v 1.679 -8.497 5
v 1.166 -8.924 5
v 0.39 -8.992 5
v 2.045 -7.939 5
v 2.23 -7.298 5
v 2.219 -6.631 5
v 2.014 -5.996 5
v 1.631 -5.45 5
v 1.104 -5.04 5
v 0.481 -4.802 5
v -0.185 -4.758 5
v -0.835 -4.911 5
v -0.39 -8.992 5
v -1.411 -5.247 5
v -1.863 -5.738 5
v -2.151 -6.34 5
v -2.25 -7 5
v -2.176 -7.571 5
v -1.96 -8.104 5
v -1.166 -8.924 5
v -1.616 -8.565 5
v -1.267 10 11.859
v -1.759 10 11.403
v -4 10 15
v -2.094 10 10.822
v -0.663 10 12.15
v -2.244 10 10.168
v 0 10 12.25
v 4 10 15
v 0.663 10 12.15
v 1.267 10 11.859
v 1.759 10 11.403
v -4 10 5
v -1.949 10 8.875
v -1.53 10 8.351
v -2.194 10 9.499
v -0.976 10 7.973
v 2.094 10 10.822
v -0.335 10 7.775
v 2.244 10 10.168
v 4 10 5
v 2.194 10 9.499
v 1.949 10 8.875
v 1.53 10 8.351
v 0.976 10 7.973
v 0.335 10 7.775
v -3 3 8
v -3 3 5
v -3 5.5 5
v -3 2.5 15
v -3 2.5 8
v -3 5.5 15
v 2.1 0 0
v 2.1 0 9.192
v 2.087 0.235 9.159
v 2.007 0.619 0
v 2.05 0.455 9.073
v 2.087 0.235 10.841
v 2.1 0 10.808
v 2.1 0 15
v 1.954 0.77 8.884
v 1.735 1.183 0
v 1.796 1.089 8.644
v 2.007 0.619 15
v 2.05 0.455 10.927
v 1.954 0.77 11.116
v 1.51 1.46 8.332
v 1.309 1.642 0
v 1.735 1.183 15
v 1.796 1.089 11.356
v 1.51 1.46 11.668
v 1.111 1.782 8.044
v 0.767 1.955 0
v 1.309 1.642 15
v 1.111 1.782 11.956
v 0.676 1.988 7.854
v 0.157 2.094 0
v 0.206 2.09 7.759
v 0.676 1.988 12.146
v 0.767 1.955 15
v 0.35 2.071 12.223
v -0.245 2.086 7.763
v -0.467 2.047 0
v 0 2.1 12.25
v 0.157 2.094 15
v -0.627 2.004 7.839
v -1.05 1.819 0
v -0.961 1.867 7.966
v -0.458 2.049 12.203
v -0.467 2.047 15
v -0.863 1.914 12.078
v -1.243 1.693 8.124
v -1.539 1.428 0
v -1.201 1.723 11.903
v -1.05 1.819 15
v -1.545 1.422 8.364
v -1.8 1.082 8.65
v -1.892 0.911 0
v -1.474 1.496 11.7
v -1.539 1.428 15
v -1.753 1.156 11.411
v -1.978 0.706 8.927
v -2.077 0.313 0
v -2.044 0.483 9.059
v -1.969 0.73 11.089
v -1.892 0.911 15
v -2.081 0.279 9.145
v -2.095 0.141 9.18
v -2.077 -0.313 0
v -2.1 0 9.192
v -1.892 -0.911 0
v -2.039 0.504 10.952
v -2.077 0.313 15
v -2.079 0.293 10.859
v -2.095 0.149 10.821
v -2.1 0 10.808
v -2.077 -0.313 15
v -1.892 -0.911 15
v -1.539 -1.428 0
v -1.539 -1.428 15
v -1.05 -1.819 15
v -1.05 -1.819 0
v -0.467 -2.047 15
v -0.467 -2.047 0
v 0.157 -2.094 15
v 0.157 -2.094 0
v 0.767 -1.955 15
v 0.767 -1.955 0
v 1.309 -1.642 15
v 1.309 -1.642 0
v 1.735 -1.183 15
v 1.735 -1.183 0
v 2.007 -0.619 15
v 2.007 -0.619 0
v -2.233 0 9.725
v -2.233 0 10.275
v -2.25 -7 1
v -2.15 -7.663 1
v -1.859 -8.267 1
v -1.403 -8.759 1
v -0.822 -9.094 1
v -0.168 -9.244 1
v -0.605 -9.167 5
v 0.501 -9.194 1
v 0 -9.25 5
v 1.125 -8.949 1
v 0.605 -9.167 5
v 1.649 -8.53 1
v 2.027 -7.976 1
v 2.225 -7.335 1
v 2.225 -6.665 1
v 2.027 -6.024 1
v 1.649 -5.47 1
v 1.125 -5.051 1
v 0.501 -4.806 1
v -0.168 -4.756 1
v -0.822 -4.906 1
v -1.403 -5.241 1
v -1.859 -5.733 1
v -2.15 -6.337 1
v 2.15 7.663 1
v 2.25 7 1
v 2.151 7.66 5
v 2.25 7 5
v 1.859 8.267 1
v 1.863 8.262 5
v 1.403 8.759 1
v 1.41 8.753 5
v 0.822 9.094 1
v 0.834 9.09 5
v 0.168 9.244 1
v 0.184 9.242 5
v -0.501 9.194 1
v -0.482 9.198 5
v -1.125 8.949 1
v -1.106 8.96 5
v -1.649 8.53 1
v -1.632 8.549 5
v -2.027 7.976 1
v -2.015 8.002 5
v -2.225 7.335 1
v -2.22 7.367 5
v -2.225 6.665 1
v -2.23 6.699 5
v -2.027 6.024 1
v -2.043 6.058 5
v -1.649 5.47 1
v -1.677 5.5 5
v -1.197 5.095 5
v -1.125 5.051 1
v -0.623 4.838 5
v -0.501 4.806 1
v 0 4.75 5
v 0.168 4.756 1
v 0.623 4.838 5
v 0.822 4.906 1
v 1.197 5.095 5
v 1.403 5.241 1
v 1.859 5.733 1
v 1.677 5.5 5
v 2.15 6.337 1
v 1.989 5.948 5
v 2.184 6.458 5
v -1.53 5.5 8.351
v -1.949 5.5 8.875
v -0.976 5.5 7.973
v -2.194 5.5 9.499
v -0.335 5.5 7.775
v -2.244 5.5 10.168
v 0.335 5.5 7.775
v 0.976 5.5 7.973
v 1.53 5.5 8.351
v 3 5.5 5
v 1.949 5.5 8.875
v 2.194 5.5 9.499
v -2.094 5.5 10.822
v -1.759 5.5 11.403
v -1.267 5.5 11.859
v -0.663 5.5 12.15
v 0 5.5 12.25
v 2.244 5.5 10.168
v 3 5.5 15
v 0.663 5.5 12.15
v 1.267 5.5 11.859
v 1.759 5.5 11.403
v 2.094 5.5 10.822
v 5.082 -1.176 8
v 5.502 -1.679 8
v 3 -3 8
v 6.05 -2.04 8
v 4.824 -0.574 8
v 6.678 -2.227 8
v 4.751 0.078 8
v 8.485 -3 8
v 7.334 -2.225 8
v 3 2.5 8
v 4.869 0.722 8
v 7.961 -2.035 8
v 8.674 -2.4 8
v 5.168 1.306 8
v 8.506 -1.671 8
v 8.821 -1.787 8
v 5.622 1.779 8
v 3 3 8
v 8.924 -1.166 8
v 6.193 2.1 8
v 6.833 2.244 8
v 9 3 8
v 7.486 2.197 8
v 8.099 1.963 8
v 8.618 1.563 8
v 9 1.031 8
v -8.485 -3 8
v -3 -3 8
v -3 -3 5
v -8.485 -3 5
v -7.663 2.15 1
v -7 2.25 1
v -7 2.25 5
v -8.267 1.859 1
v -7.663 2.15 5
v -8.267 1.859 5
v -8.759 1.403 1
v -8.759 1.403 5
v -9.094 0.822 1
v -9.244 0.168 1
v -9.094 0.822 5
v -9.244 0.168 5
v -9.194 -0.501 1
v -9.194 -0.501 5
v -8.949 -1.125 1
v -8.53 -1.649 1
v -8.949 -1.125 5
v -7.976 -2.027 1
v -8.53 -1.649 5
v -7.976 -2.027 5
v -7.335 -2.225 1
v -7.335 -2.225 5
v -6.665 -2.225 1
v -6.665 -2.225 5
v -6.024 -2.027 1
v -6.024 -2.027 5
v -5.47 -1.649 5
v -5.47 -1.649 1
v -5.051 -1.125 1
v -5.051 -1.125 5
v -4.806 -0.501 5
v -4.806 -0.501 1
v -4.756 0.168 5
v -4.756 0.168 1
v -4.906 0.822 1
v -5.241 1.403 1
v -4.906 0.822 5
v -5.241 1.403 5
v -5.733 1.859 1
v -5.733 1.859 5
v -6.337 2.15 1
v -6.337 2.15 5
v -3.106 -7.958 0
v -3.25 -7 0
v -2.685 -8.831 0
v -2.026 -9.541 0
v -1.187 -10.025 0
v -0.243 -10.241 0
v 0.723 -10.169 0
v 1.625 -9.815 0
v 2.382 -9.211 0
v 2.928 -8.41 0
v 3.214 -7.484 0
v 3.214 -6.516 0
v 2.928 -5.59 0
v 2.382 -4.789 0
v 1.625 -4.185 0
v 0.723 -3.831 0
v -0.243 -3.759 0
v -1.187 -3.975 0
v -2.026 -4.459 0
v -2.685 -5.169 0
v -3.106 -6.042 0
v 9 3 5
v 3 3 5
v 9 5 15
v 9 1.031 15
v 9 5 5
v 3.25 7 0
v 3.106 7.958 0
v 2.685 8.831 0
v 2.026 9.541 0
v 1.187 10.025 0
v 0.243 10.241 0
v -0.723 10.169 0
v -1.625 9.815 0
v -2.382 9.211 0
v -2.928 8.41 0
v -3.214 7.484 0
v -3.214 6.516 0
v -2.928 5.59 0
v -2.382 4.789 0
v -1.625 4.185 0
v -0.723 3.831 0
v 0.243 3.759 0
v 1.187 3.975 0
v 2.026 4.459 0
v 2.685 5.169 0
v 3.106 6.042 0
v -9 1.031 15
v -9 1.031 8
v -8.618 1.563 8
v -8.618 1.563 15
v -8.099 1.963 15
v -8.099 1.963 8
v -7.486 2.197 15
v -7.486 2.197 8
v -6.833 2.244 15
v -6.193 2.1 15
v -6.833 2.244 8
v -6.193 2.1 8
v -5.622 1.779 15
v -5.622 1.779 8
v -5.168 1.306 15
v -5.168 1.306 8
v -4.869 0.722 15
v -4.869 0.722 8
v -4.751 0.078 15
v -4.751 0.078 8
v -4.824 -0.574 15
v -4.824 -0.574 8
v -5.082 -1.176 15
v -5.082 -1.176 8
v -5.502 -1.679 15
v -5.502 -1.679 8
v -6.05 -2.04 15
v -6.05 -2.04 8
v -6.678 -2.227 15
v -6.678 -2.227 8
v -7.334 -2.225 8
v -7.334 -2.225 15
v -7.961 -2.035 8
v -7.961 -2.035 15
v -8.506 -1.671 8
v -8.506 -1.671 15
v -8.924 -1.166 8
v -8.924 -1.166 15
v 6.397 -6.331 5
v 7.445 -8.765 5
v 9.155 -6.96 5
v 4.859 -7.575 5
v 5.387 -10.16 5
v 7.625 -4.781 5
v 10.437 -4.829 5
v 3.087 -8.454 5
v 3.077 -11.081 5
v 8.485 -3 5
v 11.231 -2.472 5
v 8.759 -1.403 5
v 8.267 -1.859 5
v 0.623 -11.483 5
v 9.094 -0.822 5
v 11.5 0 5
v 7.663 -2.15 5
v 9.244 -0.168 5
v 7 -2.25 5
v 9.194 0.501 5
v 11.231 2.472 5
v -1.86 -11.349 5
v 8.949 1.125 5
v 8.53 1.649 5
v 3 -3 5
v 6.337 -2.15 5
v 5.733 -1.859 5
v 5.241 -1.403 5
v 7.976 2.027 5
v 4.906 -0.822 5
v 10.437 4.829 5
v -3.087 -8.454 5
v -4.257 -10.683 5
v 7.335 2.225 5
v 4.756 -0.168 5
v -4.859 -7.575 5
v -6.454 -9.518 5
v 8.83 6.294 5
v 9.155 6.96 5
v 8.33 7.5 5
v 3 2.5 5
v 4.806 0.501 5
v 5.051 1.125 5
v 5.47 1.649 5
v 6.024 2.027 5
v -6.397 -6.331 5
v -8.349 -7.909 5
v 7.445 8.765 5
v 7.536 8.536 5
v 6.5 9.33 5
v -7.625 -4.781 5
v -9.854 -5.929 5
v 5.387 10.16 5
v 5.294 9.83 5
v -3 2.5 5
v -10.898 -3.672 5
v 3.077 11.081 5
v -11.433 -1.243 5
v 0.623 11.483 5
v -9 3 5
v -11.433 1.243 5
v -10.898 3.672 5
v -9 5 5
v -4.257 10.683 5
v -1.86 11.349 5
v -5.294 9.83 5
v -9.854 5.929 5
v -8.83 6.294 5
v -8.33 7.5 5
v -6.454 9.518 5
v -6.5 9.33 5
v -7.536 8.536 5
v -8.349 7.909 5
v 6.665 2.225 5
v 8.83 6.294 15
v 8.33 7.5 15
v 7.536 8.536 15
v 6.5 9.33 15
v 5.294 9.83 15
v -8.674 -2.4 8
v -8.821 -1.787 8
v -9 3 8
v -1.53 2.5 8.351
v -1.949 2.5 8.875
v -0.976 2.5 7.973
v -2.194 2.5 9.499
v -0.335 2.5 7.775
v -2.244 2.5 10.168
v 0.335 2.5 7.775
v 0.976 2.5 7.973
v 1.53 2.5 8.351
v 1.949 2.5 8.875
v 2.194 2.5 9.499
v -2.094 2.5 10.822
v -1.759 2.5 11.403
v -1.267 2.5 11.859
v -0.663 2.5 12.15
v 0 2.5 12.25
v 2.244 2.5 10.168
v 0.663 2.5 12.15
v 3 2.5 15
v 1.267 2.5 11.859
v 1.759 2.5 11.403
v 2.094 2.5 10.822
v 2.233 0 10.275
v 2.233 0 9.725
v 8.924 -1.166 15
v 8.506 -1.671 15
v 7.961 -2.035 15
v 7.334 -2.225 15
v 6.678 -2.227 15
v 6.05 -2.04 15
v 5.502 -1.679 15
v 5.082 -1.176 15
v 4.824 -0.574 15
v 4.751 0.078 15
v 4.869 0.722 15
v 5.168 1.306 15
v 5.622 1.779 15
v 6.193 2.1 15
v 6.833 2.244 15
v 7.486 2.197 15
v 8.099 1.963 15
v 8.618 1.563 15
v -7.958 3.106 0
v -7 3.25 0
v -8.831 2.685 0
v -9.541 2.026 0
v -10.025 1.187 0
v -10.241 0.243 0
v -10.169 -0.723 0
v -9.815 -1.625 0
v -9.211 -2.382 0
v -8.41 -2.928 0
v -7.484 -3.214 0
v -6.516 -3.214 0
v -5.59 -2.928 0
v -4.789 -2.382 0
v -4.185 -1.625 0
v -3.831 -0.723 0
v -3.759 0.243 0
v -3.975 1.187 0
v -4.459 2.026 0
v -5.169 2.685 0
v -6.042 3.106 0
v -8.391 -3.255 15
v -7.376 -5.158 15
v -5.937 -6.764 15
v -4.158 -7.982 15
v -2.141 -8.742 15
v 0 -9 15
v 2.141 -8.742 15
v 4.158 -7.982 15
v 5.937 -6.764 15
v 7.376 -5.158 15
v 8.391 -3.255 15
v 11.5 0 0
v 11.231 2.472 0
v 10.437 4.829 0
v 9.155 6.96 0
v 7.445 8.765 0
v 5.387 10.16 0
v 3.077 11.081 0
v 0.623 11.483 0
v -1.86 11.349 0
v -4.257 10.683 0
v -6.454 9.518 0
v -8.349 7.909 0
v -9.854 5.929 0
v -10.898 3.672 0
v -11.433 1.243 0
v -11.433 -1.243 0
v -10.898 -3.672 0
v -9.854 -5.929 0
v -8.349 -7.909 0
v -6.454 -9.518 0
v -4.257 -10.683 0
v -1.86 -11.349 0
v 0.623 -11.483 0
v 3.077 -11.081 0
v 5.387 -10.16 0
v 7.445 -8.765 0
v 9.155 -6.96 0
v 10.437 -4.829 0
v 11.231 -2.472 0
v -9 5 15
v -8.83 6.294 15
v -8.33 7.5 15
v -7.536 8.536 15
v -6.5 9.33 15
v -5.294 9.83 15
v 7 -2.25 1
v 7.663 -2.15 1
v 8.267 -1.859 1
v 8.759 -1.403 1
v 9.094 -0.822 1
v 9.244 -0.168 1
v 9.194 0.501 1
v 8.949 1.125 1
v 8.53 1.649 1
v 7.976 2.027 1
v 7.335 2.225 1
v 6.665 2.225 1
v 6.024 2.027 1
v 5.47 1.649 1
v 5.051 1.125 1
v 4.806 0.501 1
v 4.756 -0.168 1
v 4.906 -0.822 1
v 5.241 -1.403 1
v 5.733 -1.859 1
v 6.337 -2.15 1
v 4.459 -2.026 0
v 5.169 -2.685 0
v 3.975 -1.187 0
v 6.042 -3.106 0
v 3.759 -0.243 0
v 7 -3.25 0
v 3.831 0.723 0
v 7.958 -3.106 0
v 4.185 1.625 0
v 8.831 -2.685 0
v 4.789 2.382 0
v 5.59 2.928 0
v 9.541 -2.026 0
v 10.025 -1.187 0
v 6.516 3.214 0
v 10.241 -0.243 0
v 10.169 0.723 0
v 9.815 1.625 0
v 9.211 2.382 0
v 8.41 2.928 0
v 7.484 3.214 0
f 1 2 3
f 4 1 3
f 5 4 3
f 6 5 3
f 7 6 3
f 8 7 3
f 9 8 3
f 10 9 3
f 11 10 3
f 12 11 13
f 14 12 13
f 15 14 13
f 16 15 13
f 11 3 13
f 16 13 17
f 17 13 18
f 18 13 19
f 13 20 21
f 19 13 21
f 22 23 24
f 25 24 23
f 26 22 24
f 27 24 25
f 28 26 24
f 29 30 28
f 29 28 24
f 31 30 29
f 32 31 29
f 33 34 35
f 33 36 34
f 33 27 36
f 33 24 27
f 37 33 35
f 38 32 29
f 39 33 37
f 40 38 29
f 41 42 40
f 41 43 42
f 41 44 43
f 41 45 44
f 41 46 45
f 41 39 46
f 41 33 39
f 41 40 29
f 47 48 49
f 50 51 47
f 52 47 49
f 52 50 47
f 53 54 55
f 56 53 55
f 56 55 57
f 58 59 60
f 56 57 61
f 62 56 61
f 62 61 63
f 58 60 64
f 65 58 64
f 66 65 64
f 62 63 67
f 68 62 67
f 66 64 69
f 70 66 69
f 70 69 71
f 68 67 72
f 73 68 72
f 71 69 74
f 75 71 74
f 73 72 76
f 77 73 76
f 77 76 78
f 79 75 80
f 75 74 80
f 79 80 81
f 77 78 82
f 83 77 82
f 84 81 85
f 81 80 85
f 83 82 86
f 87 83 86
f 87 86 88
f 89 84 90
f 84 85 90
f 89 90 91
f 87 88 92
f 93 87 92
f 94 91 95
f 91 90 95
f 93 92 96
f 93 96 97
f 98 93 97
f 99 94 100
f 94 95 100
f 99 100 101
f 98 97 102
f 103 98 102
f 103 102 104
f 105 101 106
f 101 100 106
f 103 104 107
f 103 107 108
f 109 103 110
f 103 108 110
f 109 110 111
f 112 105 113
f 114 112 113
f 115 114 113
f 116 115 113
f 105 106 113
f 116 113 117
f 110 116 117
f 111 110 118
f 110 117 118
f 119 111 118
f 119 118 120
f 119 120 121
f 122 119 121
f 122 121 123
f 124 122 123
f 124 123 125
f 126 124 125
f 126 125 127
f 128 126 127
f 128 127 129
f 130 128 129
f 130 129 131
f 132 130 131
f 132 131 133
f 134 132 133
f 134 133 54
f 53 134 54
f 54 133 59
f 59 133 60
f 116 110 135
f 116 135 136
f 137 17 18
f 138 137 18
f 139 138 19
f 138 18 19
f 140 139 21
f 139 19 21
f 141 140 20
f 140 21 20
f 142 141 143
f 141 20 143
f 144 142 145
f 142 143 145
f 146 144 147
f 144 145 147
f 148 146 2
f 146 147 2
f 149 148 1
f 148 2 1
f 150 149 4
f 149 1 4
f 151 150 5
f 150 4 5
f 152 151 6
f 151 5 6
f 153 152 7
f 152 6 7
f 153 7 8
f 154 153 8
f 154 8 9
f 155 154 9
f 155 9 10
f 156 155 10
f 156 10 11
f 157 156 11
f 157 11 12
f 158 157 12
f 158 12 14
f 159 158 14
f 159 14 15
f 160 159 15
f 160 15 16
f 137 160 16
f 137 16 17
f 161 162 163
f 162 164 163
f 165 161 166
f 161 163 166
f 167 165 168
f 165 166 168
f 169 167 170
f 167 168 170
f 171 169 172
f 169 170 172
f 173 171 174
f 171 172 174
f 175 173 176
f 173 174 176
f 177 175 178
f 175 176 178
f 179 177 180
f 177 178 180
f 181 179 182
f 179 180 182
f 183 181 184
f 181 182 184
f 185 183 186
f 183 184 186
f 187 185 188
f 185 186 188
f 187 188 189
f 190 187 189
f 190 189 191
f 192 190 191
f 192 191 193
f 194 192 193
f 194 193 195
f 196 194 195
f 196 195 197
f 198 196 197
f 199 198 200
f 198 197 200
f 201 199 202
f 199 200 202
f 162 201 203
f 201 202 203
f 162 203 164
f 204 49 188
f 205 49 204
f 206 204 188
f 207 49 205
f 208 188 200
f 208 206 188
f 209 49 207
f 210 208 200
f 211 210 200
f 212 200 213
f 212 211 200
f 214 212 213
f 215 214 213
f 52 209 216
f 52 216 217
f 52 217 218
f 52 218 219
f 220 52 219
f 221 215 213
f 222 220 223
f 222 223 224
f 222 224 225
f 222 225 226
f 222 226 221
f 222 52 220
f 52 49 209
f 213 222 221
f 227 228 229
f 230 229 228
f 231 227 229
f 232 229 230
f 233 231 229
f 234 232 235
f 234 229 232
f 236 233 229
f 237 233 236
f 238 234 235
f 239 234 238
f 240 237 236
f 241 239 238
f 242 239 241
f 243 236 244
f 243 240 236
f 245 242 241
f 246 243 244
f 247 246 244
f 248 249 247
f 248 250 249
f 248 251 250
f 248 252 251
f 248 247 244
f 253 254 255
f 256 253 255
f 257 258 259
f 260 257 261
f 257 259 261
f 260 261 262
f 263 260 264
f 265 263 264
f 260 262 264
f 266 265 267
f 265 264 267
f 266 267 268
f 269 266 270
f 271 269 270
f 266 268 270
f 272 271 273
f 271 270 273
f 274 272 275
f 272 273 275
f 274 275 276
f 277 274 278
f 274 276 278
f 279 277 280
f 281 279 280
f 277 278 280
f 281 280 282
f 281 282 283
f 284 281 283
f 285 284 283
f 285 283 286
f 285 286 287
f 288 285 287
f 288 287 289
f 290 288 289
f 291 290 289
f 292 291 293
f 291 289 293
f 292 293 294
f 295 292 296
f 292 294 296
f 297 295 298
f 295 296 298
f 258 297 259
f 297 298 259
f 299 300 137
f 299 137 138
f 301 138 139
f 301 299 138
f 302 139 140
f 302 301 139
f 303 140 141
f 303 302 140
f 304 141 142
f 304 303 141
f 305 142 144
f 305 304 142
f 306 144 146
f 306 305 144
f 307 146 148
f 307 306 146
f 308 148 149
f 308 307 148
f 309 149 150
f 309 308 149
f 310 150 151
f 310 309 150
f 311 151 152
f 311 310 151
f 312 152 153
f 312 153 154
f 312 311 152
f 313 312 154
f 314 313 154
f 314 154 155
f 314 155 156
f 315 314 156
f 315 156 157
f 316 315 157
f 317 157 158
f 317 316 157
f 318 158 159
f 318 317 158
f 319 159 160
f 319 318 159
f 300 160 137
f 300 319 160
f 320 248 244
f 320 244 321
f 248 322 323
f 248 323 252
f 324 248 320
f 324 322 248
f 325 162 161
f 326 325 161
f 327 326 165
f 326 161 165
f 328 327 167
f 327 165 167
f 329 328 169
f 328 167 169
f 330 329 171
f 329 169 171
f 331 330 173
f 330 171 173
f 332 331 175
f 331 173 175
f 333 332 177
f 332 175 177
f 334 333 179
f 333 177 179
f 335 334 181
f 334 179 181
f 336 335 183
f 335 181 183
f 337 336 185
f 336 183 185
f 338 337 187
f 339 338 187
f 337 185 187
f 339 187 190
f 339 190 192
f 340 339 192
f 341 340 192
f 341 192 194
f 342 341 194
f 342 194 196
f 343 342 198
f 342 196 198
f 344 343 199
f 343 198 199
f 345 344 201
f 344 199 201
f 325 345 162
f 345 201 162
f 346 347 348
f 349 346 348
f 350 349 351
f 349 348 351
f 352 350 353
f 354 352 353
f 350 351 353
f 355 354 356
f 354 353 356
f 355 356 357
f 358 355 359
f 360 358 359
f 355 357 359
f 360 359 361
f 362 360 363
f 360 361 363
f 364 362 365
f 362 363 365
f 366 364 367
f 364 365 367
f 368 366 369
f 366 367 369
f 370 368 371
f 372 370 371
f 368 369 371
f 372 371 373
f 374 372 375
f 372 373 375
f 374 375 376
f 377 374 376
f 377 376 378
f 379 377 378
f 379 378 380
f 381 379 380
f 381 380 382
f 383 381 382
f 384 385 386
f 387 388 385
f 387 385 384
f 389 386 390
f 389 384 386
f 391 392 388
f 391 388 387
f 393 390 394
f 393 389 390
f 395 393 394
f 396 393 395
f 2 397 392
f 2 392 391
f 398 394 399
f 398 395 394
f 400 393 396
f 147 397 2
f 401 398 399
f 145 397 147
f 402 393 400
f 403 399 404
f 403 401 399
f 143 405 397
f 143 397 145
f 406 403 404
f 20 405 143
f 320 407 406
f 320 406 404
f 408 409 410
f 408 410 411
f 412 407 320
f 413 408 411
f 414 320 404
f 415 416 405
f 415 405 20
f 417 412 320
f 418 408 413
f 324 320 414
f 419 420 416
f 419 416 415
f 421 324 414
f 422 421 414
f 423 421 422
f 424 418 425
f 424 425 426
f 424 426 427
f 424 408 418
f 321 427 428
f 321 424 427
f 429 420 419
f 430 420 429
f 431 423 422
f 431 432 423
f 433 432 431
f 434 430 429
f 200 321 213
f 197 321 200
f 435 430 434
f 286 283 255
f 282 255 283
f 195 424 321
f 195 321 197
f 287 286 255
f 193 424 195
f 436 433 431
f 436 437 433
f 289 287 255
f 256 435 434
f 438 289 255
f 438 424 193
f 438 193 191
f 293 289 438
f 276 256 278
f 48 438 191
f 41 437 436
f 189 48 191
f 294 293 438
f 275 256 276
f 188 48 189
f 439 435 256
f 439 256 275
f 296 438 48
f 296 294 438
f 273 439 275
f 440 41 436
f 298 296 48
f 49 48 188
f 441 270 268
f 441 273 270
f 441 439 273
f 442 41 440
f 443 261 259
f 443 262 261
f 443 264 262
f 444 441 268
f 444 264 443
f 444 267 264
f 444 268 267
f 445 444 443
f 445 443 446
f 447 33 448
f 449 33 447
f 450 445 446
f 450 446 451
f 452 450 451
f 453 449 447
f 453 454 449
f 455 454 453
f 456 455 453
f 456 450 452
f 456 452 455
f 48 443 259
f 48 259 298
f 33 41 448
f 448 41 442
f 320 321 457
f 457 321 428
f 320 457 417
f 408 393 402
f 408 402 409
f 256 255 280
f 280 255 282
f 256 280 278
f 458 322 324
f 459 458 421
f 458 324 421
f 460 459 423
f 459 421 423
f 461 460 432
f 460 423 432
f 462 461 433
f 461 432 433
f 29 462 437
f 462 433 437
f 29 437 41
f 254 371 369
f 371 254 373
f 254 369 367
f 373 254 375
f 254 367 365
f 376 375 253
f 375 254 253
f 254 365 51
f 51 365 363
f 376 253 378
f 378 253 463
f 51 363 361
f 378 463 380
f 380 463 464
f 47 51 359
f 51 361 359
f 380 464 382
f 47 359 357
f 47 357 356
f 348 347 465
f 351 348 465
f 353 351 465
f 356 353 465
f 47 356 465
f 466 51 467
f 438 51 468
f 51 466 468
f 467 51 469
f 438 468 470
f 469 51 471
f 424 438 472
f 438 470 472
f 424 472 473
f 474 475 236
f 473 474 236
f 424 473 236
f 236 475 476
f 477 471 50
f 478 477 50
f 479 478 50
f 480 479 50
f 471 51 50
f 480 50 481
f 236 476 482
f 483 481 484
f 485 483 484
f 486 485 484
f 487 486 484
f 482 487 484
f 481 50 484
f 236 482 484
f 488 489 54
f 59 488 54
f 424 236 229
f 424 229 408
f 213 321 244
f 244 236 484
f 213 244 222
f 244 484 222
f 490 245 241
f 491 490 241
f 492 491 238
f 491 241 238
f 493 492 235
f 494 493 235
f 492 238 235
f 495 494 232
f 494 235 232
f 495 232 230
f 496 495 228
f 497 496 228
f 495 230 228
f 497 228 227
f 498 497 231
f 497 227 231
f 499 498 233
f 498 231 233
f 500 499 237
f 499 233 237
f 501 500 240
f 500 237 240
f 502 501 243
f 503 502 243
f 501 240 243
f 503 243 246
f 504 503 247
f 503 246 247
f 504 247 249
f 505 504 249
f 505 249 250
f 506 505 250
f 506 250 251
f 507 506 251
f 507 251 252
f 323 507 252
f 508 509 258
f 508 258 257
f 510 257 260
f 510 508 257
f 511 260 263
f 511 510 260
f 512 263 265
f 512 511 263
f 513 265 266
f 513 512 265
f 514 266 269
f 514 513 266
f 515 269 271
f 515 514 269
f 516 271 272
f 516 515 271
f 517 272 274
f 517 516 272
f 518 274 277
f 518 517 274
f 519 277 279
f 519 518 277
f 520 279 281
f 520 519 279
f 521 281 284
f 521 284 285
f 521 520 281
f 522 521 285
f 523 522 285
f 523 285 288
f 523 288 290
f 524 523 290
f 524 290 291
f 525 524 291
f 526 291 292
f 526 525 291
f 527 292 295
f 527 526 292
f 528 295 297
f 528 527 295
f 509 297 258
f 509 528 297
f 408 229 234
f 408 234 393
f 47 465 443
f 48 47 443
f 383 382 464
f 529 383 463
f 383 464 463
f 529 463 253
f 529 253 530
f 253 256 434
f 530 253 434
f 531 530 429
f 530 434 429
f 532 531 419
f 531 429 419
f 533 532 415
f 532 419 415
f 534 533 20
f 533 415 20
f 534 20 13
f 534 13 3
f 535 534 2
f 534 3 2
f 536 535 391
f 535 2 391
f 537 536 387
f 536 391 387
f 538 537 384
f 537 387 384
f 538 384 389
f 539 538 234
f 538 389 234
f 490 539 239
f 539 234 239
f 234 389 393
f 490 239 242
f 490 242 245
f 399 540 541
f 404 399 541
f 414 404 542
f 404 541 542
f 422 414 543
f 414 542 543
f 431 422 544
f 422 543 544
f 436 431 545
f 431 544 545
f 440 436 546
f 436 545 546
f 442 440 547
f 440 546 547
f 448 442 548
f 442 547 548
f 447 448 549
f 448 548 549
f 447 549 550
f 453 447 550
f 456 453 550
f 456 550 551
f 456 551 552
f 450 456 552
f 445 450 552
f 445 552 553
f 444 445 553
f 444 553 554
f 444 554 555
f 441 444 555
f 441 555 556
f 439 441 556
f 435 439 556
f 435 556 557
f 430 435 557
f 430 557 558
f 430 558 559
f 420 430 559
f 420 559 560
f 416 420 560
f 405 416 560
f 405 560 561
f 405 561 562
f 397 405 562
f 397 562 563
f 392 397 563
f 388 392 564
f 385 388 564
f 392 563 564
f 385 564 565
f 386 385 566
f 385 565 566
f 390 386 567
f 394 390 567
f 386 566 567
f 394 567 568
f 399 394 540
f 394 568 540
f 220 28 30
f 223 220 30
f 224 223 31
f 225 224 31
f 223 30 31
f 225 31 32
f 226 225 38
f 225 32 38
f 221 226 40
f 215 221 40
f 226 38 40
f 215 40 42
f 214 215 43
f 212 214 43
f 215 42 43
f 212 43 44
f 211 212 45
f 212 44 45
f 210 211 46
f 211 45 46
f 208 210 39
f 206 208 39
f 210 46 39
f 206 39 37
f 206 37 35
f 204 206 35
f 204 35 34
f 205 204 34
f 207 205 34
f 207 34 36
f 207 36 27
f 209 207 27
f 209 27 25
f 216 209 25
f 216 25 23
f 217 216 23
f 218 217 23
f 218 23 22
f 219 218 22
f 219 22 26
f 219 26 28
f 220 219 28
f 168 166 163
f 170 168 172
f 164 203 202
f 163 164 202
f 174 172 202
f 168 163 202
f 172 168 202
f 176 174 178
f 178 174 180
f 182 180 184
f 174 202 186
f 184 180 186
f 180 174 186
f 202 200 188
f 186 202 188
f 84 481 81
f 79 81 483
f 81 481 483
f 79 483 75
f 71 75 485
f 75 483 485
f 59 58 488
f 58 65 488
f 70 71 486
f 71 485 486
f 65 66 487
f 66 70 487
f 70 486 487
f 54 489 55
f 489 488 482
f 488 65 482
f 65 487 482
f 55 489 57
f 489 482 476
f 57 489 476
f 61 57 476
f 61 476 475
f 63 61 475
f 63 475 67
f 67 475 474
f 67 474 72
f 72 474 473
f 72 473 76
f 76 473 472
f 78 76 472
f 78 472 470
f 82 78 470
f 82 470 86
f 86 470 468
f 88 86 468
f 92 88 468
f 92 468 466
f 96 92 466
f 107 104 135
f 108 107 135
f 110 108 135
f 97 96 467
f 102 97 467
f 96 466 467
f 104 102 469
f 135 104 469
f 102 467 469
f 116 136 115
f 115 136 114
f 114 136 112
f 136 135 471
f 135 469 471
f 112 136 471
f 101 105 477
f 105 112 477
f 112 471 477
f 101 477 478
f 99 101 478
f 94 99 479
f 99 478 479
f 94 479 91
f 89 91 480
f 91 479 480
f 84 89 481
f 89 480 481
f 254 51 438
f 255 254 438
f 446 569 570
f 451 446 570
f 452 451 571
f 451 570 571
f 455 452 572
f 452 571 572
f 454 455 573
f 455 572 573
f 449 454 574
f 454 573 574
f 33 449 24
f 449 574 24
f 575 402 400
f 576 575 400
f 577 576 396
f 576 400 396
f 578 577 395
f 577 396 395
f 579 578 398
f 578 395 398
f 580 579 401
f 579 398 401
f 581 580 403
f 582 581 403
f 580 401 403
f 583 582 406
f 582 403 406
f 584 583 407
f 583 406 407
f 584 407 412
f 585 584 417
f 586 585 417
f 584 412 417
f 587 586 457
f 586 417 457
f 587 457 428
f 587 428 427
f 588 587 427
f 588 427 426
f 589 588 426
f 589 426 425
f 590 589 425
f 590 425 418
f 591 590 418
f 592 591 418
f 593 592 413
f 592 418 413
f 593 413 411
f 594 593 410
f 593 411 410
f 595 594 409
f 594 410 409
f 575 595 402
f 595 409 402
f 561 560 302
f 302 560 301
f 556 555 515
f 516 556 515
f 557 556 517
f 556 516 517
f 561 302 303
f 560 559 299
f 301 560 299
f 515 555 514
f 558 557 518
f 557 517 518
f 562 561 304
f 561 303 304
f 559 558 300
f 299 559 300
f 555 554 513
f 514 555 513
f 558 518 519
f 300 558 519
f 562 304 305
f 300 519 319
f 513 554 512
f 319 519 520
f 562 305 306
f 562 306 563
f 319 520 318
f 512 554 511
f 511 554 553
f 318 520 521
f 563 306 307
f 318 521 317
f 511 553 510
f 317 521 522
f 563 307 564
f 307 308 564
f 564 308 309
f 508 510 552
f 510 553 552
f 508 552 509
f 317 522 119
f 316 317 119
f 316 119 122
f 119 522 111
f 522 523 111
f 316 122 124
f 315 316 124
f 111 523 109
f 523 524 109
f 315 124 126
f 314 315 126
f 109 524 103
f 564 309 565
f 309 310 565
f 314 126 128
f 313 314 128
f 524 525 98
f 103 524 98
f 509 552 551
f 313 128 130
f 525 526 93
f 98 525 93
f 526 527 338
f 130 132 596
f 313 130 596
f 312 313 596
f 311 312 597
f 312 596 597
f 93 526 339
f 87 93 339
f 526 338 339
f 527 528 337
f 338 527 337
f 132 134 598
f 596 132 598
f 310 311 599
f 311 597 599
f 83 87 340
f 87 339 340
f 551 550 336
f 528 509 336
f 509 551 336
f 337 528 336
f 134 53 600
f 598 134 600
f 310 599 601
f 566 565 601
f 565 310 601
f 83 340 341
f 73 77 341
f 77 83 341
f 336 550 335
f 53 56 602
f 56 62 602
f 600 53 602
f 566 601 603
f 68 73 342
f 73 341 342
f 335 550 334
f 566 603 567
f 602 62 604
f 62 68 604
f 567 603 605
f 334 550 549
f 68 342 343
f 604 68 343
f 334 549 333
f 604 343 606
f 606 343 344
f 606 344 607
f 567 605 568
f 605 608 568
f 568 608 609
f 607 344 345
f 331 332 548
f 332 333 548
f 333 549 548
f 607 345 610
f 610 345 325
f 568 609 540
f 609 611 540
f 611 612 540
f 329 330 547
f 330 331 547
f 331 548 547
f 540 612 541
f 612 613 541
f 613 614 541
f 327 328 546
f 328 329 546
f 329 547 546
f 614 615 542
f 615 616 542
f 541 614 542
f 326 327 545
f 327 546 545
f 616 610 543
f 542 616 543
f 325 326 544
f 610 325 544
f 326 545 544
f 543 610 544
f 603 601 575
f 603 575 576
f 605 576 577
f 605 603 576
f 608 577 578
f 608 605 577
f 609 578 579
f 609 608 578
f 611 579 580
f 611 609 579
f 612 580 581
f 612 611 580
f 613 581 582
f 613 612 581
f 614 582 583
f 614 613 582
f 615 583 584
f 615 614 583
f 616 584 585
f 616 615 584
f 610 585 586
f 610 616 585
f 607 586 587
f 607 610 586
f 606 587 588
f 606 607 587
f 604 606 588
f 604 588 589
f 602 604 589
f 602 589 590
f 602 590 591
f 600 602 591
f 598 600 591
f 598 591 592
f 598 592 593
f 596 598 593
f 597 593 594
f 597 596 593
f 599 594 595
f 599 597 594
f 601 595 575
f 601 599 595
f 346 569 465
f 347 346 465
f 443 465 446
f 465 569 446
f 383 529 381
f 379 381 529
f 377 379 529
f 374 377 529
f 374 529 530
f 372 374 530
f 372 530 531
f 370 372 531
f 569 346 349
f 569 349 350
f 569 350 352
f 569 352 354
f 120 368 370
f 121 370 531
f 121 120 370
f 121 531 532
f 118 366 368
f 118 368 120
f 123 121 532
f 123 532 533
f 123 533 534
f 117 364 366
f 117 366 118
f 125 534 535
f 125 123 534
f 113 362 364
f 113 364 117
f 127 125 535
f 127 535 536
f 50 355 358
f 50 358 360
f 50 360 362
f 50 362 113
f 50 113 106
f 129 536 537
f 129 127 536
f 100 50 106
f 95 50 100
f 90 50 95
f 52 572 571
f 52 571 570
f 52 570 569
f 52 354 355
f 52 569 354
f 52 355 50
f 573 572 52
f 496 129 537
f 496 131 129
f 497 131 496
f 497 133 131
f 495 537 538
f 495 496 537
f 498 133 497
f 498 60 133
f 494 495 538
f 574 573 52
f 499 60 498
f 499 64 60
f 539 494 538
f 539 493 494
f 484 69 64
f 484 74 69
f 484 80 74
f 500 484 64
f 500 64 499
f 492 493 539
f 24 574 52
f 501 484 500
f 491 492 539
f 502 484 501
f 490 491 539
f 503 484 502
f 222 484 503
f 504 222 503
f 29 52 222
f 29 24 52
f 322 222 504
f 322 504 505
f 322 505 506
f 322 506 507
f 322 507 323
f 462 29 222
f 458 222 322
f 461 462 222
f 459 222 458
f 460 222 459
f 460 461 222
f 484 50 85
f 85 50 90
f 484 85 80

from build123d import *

# Parameters (mm, degrees)
SKETCH1_R           = 11.5
BOSS_EXTRUDE1_DEPTH = 5
SKETCH2_R           = 2.25
CUT_EXTRUDE1_DEPTH  = 18.014699527
CIRPATTERN1_COUNT   = 4
SKETCH3_R           = 9
BOSS_EXTRUDE2_DEPTH = 10
SKETCH4_R           = 2.1
CUT_EXTRUDE2_DEPTH  = 23.12464689
BOSS_EXTRUDE3_REACH = 30.627
SKETCH5_W           = 18
SKETCH5_H           = 10
SKETCH6_R           = 2.25
CUT_EXTRUDE3_DEPTH  = 10
CHAMFER2_SIZE       = 1
FILLET1_R           = 5
CUT_EXTRUDE4_DEPTH  = 20.091883144
SKETCH8_W           = 6
SKETCH8_H           = 3
CUT_EXTRUDE7_DEPTH  = 10
SKETCH9_W           = 3
SKETCH9_H           = 6
CUT_EXTRUDE8_DEPTH  = 6


with BuildPart() as part:
    # Sketch1 → Boss-Extrude1 (new body)
    with BuildSketch(Plane.XY):
        Circle(SKETCH1_R)
    extrude(amount=BOSS_EXTRUDE1_DEPTH)

    # Sketch2 → Cut-Extrude1 (cut, through all)
    with BuildSketch(Plane.XY.offset(5)):
        with Locations((0, 7)):
            Circle(SKETCH2_R)
    cut_extrude1 = extrude(amount=-CUT_EXTRUDE1_DEPTH, mode=Mode.SUBTRACT)

    # CirPattern1: Cut-Extrude1 ×4 about axis
    cirpattern1_axis = Axis((0, 0, 0), (0, 0, 1))
    for i in range(1, CIRPATTERN1_COUNT):
        add(cut_extrude1.rotate(cirpattern1_axis, i * 360 / CIRPATTERN1_COUNT), mode=Mode.SUBTRACT)

    # Sketch3 → Boss-Extrude2 (add)
    with BuildSketch(Plane.XY.offset(5)):
        with Locations(Location((0, 0, 0), (0, 0, 172.554009398))):
            Circle(SKETCH3_R)
    extrude(amount=BOSS_EXTRUDE2_DEPTH)

    # Sketch4 → Cut-Extrude2 (cut, through all)
    with BuildSketch(Plane.XY.offset(15)):
        Circle(SKETCH4_R)
    extrude(amount=-CUT_EXTRUDE2_DEPTH, mode=Mode.SUBTRACT)

    # Sketch5 → Boss-Extrude3 (add, up to next)
    with BuildSketch(Plane(origin=(0, 10, 0), x_dir=(1, 0, 0), z_dir=(0, 1, 0)), mode=Mode.PRIVATE) as boss_extrude3_sk1:
        with Locations((0, -10)):
            Rectangle(SKETCH5_W, SKETCH5_H)
    boss_extrude3_tool1 = extrude(boss_extrude3_sk1.sketch, amount=-BOSS_EXTRUDE3_REACH, mode=Mode.PRIVATE) - part.part
    add(boss_extrude3_tool1.solids().sort_by_distance((0, 10, 10))[0])

    # Sketch6 → Cut-Extrude3 (cut)
    with BuildSketch(Plane(origin=(0, 10, 0), x_dir=(1, 0, 0), z_dir=(0, 1, 0))):
        with Locations(Location((0, -10, 0), (0, 0, 270))):
            Circle(SKETCH6_R)
    extrude(amount=-CUT_EXTRUDE3_DEPTH, mode=Mode.SUBTRACT)

    # Chamfer2
    chamfer2_edges = [part.edges().sort_by_distance(p)[0] for p in [
        (-7, -2.25, 0),
        (2.25, -7, 0),
        (7, 2.25, 0),
        (-2.25, 7, 0),
    ]]
    chamfer(chamfer2_edges, length=CHAMFER2_SIZE)

    # Fillet1
    # the kernel refuses this fillet: 5 mm, written as the material it takes off along each edge
    with BuildSketch(Plane(origin=(-9, 10, 27.5), x_dir=(0, -1, 0), z_dir=(0, 0, -1)), Plane(origin=(9, 10, 5), x_dir=(0, -1, 0), z_dir=(0, 0, 1))) as fillet1_piece_1:
        with BuildLine():
            CenterArc((FILLET1_R, -FILLET1_R), FILLET1_R, 90, 90)
            Line((0, -FILLET1_R), (0, 0))
            Line((0, 0), (FILLET1_R, 0))
        make_face()
    extrude(amount=22.5, mode=Mode.SUBTRACT)

    # Sketch7 → Cut-Extrude4 (cut, through all)
    with BuildSketch(Plane(origin=(0, 0, 5), x_dir=(-1, 0, 0), z_dir=(0, 0, -1))):
        with BuildLine():
            Line((-9, 1.030776406), (-9, 0))
            ThreePointArc((-9, 0), (-8.981006744, -0.584395292), (-8.924107143, -1.166324013))
            ThreePointArc((-8.924107143, -1.166324013), (-4.751341115, 0.077673804), (-9, 1.030776406))
        make_face()
        with BuildLine():
            Line((9, 0), (9, 1.030776406))
            ThreePointArc((9, 1.030776406), (4.751341115, 0.077673804), (8.924107143, -1.166324013))
            ThreePointArc((8.924107143, -1.166324013), (8.981006744, -0.584395292), (9, 0))
        make_face()
    extrude(amount=-CUT_EXTRUDE4_DEPTH, mode=Mode.SUBTRACT)

    # Sketch8 → Cut-Extrude7 (cut)
    with BuildSketch(Plane.XY.offset(15)):
        with Locations((0, 4)):
            Rectangle(SKETCH8_W, SKETCH8_H)
    extrude(amount=-CUT_EXTRUDE7_DEPTH, mode=Mode.SUBTRACT)

    # Sketch9 → Cut-Extrude8 (cut)
    with BuildSketch(Plane(origin=(9, 0, 0), x_dir=(0, 0, -1), z_dir=(1, 0, 0))):
        with Locations((-6.5, 0)):
            Rectangle(SKETCH9_W, SKETCH9_H)
    cut_extrude8 = extrude(amount=-CUT_EXTRUDE8_DEPTH, mode=Mode.SUBTRACT)

    # Mirror1: Cut-Extrude8 across plane
    add(cut_extrude8.mirror(Plane(origin=(0, 0, 0), x_dir=(0, 0, 1), z_dir=(1, 0, 0))), mode=Mode.SUBTRACT)


solid = part.part
